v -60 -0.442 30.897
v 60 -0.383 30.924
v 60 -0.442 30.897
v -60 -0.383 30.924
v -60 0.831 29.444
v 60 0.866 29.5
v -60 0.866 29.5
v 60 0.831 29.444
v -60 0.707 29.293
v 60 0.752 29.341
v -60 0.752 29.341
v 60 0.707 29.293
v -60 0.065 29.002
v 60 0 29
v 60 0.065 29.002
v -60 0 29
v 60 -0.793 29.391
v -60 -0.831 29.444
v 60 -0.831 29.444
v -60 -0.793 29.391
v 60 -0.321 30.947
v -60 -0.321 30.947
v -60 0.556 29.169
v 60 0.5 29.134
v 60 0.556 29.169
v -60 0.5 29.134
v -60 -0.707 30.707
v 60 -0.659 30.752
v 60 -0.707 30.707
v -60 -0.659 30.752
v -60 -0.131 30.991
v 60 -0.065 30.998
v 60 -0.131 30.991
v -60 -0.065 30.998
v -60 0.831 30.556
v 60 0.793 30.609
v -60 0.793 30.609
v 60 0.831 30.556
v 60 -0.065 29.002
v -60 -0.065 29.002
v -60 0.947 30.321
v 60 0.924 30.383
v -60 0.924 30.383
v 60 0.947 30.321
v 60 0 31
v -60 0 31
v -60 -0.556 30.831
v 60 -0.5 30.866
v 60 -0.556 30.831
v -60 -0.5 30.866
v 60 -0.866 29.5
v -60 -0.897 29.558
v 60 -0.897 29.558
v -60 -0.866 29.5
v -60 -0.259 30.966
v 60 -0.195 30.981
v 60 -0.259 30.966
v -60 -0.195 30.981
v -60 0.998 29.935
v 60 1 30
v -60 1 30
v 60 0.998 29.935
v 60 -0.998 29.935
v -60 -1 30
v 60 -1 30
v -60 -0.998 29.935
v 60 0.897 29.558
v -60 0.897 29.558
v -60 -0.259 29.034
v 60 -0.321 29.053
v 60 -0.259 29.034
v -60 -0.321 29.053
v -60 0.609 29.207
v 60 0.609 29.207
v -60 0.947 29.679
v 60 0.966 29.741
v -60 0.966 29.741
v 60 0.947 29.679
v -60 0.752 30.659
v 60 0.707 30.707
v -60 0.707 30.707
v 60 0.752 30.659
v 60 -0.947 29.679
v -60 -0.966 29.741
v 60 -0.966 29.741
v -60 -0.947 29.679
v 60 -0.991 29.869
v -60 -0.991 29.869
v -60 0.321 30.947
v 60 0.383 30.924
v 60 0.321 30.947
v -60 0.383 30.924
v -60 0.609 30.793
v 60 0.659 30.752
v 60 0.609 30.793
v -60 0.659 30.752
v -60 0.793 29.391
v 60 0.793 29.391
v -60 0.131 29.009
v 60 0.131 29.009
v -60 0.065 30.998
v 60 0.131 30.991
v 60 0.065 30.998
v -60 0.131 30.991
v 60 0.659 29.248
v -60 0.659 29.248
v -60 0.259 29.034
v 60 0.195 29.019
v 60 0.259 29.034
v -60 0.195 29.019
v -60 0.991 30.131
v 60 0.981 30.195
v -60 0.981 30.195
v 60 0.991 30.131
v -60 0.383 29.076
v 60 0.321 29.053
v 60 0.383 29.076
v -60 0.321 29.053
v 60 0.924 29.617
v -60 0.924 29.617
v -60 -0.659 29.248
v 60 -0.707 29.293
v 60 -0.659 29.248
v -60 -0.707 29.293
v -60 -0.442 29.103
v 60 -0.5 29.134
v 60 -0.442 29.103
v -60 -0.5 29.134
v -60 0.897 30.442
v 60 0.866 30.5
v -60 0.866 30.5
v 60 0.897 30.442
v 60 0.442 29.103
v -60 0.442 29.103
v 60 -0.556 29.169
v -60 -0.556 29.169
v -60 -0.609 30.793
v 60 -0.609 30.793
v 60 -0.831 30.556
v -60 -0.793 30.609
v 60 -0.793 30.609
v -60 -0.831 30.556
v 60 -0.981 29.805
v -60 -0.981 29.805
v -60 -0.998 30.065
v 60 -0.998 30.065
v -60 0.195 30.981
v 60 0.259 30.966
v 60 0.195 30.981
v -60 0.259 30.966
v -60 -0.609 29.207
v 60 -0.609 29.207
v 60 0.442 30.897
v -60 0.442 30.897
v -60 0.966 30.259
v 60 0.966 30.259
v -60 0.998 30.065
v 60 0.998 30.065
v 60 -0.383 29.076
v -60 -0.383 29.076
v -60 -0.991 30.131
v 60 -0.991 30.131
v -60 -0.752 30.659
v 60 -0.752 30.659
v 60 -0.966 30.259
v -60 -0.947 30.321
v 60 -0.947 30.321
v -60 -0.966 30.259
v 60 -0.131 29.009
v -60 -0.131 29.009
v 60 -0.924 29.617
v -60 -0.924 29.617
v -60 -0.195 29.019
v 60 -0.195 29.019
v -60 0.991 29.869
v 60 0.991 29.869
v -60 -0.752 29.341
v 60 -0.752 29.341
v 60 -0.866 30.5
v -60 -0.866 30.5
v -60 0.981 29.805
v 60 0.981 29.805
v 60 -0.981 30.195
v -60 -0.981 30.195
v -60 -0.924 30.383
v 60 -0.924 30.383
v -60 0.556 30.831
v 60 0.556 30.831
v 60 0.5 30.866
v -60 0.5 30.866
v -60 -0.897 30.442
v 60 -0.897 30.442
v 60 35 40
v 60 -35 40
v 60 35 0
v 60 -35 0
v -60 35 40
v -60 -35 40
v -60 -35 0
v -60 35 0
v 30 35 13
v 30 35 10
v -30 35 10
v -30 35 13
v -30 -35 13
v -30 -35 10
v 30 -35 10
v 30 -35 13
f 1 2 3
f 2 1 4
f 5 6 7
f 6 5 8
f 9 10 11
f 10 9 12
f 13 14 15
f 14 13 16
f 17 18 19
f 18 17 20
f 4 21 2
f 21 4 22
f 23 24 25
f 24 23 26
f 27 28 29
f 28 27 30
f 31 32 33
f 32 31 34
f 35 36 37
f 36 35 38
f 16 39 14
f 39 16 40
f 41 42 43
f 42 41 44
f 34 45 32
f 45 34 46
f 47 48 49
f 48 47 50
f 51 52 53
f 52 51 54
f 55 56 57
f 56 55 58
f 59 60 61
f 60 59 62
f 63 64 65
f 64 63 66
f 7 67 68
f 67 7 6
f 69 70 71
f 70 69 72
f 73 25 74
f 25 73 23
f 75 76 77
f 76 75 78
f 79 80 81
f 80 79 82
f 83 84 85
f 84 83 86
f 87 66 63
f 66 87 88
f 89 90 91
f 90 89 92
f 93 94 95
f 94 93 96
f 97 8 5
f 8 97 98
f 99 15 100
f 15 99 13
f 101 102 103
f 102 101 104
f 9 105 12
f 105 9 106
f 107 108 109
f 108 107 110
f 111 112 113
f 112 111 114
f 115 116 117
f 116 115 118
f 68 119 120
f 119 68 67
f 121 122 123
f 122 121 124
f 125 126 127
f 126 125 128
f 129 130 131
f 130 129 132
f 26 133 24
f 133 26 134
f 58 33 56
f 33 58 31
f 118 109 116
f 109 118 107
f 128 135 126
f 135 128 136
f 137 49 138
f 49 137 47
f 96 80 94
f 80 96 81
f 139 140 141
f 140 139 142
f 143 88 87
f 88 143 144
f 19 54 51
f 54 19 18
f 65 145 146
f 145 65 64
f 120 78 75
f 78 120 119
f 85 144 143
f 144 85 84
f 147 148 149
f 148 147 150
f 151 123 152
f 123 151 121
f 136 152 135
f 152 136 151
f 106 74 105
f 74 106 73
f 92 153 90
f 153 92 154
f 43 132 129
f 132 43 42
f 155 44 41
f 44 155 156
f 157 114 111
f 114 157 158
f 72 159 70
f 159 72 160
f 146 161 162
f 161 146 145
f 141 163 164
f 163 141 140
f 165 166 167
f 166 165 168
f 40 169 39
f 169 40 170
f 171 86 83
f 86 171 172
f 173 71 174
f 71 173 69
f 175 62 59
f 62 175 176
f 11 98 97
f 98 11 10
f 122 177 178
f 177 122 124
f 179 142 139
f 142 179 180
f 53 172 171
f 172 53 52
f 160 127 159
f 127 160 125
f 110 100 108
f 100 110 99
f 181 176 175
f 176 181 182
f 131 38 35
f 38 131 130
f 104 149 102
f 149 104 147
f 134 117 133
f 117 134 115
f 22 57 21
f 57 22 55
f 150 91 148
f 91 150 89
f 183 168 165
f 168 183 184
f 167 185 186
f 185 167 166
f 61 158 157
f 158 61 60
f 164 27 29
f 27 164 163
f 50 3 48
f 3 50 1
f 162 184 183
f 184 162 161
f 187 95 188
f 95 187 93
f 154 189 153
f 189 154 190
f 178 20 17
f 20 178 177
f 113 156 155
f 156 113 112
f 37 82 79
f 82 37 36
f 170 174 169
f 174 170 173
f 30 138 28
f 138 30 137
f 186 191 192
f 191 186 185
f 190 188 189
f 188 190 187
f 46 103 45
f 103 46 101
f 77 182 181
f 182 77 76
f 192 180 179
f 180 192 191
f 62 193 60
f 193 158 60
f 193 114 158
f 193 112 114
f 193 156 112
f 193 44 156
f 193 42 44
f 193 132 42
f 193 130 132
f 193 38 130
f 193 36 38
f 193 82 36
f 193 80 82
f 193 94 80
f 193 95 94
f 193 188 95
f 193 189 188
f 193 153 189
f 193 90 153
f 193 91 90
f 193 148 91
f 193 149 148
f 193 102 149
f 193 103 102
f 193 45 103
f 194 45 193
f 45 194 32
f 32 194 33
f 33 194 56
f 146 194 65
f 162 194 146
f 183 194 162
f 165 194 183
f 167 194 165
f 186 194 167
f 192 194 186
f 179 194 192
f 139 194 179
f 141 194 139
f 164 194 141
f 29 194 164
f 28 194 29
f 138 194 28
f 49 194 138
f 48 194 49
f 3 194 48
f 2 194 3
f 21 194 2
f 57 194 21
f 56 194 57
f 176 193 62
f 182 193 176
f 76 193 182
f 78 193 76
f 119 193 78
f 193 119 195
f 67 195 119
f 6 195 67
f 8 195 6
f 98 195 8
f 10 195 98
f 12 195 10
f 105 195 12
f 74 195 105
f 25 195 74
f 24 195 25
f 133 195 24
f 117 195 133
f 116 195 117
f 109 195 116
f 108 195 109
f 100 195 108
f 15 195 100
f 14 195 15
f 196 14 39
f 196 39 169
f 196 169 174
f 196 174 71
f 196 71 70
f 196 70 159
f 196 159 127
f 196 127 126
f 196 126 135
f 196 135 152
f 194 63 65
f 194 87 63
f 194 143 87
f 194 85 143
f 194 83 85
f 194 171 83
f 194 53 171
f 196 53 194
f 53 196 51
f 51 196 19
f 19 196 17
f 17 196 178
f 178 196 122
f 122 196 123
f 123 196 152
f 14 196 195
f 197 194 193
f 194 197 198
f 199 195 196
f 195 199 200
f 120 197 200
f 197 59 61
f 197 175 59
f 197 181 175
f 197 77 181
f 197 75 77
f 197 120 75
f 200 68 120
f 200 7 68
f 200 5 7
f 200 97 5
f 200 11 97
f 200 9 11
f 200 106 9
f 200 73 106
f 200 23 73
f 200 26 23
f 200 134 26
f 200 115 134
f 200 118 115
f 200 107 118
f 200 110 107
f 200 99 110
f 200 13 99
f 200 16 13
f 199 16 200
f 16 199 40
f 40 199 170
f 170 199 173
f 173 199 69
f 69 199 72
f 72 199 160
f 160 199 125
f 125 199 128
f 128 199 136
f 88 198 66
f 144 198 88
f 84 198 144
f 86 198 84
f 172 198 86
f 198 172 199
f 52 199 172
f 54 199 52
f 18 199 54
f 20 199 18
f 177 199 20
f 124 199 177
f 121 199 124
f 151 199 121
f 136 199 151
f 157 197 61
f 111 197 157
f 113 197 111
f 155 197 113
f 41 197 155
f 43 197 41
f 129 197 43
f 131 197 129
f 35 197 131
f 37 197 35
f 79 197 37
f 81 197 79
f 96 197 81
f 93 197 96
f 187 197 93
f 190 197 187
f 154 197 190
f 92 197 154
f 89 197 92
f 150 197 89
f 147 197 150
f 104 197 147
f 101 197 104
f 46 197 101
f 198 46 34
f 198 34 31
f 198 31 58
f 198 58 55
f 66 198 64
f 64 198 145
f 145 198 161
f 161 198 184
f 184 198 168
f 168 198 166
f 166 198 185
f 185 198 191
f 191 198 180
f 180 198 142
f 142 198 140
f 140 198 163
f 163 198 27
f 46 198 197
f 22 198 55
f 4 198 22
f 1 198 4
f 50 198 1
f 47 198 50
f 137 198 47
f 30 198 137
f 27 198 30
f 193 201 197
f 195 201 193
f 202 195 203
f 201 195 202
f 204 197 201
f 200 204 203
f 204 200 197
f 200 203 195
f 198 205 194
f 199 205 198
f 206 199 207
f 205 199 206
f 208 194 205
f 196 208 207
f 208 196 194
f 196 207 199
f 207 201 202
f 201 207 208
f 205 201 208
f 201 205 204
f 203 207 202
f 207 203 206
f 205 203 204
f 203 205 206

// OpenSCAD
// Buffer tank for mini horizontal gel-electrophoresis box
// Print orientation: open top facing up (+Z), resting on XY plane at z = 0

// ---------------- Parameters ----------------
tank_x      = 120;   // outer length in X (mm)
tank_y      = 70;    // outer width in Y (mm)
tank_h      = 40;    // outer height in Z (mm)
wall        = 3;     // wall thickness (mm)
floor       = 3;     // floor thickness (mm)

platform_x  = 60;    // platform length in X (mm), centred
platform_y  = tank_y; // platform spans full inner width (mm)
platform_top = 13;   // platform top height above tank floor (mm)
// z = 13 is 10 mm above the inner floor (floor = 3 mm thick)

hole_d      = 2;     // electrode hole diameter (mm)
hole_y      = 0;     // electrode hole Y position (mm)
hole_z      = 30;    // electrode hole Z position (mm)

eps         = 0.5;   // cutter overshoot past faces (mm)

$fn = 96;

// ---------------- Derived ----------------
inner_x = tank_x - 2 * wall;   // 114 mm
inner_y = tank_y - 2 * wall;   // 64 mm
inner_z = tank_h - floor;      // 37 mm (floor at bottom, open top)

platform_z0 = platform_top - floor;  // platform bottom height = 10 mm
// platform thickness = platform_top - platform_z0 = 3 mm

// ---------------- Model ----------------
difference() {
    // Main tank body
    translate([-tank_x / 2, -tank_y / 2, 0])
        cube([tank_x, tank_y, tank_h]);

    // Raised platform in the middle, centred in X, spans full Y
    translate([-platform_x / 2, -platform_y / 2, platform_z0])
        cube([platform_x, platform_y, platform_top - platform_z0]);

    // Horizontal electrode holes through each end wall, along X
    for (s = [-1, 1])
        translate([s > 0 ? tank_x / 2 - eps : -tank_x / 2 - eps,
                   hole_y,
                   hole_z])
            rotate([0, 90, 0])
                cylinder(d = hole_d, h = tank_x + 2 * eps);
}
